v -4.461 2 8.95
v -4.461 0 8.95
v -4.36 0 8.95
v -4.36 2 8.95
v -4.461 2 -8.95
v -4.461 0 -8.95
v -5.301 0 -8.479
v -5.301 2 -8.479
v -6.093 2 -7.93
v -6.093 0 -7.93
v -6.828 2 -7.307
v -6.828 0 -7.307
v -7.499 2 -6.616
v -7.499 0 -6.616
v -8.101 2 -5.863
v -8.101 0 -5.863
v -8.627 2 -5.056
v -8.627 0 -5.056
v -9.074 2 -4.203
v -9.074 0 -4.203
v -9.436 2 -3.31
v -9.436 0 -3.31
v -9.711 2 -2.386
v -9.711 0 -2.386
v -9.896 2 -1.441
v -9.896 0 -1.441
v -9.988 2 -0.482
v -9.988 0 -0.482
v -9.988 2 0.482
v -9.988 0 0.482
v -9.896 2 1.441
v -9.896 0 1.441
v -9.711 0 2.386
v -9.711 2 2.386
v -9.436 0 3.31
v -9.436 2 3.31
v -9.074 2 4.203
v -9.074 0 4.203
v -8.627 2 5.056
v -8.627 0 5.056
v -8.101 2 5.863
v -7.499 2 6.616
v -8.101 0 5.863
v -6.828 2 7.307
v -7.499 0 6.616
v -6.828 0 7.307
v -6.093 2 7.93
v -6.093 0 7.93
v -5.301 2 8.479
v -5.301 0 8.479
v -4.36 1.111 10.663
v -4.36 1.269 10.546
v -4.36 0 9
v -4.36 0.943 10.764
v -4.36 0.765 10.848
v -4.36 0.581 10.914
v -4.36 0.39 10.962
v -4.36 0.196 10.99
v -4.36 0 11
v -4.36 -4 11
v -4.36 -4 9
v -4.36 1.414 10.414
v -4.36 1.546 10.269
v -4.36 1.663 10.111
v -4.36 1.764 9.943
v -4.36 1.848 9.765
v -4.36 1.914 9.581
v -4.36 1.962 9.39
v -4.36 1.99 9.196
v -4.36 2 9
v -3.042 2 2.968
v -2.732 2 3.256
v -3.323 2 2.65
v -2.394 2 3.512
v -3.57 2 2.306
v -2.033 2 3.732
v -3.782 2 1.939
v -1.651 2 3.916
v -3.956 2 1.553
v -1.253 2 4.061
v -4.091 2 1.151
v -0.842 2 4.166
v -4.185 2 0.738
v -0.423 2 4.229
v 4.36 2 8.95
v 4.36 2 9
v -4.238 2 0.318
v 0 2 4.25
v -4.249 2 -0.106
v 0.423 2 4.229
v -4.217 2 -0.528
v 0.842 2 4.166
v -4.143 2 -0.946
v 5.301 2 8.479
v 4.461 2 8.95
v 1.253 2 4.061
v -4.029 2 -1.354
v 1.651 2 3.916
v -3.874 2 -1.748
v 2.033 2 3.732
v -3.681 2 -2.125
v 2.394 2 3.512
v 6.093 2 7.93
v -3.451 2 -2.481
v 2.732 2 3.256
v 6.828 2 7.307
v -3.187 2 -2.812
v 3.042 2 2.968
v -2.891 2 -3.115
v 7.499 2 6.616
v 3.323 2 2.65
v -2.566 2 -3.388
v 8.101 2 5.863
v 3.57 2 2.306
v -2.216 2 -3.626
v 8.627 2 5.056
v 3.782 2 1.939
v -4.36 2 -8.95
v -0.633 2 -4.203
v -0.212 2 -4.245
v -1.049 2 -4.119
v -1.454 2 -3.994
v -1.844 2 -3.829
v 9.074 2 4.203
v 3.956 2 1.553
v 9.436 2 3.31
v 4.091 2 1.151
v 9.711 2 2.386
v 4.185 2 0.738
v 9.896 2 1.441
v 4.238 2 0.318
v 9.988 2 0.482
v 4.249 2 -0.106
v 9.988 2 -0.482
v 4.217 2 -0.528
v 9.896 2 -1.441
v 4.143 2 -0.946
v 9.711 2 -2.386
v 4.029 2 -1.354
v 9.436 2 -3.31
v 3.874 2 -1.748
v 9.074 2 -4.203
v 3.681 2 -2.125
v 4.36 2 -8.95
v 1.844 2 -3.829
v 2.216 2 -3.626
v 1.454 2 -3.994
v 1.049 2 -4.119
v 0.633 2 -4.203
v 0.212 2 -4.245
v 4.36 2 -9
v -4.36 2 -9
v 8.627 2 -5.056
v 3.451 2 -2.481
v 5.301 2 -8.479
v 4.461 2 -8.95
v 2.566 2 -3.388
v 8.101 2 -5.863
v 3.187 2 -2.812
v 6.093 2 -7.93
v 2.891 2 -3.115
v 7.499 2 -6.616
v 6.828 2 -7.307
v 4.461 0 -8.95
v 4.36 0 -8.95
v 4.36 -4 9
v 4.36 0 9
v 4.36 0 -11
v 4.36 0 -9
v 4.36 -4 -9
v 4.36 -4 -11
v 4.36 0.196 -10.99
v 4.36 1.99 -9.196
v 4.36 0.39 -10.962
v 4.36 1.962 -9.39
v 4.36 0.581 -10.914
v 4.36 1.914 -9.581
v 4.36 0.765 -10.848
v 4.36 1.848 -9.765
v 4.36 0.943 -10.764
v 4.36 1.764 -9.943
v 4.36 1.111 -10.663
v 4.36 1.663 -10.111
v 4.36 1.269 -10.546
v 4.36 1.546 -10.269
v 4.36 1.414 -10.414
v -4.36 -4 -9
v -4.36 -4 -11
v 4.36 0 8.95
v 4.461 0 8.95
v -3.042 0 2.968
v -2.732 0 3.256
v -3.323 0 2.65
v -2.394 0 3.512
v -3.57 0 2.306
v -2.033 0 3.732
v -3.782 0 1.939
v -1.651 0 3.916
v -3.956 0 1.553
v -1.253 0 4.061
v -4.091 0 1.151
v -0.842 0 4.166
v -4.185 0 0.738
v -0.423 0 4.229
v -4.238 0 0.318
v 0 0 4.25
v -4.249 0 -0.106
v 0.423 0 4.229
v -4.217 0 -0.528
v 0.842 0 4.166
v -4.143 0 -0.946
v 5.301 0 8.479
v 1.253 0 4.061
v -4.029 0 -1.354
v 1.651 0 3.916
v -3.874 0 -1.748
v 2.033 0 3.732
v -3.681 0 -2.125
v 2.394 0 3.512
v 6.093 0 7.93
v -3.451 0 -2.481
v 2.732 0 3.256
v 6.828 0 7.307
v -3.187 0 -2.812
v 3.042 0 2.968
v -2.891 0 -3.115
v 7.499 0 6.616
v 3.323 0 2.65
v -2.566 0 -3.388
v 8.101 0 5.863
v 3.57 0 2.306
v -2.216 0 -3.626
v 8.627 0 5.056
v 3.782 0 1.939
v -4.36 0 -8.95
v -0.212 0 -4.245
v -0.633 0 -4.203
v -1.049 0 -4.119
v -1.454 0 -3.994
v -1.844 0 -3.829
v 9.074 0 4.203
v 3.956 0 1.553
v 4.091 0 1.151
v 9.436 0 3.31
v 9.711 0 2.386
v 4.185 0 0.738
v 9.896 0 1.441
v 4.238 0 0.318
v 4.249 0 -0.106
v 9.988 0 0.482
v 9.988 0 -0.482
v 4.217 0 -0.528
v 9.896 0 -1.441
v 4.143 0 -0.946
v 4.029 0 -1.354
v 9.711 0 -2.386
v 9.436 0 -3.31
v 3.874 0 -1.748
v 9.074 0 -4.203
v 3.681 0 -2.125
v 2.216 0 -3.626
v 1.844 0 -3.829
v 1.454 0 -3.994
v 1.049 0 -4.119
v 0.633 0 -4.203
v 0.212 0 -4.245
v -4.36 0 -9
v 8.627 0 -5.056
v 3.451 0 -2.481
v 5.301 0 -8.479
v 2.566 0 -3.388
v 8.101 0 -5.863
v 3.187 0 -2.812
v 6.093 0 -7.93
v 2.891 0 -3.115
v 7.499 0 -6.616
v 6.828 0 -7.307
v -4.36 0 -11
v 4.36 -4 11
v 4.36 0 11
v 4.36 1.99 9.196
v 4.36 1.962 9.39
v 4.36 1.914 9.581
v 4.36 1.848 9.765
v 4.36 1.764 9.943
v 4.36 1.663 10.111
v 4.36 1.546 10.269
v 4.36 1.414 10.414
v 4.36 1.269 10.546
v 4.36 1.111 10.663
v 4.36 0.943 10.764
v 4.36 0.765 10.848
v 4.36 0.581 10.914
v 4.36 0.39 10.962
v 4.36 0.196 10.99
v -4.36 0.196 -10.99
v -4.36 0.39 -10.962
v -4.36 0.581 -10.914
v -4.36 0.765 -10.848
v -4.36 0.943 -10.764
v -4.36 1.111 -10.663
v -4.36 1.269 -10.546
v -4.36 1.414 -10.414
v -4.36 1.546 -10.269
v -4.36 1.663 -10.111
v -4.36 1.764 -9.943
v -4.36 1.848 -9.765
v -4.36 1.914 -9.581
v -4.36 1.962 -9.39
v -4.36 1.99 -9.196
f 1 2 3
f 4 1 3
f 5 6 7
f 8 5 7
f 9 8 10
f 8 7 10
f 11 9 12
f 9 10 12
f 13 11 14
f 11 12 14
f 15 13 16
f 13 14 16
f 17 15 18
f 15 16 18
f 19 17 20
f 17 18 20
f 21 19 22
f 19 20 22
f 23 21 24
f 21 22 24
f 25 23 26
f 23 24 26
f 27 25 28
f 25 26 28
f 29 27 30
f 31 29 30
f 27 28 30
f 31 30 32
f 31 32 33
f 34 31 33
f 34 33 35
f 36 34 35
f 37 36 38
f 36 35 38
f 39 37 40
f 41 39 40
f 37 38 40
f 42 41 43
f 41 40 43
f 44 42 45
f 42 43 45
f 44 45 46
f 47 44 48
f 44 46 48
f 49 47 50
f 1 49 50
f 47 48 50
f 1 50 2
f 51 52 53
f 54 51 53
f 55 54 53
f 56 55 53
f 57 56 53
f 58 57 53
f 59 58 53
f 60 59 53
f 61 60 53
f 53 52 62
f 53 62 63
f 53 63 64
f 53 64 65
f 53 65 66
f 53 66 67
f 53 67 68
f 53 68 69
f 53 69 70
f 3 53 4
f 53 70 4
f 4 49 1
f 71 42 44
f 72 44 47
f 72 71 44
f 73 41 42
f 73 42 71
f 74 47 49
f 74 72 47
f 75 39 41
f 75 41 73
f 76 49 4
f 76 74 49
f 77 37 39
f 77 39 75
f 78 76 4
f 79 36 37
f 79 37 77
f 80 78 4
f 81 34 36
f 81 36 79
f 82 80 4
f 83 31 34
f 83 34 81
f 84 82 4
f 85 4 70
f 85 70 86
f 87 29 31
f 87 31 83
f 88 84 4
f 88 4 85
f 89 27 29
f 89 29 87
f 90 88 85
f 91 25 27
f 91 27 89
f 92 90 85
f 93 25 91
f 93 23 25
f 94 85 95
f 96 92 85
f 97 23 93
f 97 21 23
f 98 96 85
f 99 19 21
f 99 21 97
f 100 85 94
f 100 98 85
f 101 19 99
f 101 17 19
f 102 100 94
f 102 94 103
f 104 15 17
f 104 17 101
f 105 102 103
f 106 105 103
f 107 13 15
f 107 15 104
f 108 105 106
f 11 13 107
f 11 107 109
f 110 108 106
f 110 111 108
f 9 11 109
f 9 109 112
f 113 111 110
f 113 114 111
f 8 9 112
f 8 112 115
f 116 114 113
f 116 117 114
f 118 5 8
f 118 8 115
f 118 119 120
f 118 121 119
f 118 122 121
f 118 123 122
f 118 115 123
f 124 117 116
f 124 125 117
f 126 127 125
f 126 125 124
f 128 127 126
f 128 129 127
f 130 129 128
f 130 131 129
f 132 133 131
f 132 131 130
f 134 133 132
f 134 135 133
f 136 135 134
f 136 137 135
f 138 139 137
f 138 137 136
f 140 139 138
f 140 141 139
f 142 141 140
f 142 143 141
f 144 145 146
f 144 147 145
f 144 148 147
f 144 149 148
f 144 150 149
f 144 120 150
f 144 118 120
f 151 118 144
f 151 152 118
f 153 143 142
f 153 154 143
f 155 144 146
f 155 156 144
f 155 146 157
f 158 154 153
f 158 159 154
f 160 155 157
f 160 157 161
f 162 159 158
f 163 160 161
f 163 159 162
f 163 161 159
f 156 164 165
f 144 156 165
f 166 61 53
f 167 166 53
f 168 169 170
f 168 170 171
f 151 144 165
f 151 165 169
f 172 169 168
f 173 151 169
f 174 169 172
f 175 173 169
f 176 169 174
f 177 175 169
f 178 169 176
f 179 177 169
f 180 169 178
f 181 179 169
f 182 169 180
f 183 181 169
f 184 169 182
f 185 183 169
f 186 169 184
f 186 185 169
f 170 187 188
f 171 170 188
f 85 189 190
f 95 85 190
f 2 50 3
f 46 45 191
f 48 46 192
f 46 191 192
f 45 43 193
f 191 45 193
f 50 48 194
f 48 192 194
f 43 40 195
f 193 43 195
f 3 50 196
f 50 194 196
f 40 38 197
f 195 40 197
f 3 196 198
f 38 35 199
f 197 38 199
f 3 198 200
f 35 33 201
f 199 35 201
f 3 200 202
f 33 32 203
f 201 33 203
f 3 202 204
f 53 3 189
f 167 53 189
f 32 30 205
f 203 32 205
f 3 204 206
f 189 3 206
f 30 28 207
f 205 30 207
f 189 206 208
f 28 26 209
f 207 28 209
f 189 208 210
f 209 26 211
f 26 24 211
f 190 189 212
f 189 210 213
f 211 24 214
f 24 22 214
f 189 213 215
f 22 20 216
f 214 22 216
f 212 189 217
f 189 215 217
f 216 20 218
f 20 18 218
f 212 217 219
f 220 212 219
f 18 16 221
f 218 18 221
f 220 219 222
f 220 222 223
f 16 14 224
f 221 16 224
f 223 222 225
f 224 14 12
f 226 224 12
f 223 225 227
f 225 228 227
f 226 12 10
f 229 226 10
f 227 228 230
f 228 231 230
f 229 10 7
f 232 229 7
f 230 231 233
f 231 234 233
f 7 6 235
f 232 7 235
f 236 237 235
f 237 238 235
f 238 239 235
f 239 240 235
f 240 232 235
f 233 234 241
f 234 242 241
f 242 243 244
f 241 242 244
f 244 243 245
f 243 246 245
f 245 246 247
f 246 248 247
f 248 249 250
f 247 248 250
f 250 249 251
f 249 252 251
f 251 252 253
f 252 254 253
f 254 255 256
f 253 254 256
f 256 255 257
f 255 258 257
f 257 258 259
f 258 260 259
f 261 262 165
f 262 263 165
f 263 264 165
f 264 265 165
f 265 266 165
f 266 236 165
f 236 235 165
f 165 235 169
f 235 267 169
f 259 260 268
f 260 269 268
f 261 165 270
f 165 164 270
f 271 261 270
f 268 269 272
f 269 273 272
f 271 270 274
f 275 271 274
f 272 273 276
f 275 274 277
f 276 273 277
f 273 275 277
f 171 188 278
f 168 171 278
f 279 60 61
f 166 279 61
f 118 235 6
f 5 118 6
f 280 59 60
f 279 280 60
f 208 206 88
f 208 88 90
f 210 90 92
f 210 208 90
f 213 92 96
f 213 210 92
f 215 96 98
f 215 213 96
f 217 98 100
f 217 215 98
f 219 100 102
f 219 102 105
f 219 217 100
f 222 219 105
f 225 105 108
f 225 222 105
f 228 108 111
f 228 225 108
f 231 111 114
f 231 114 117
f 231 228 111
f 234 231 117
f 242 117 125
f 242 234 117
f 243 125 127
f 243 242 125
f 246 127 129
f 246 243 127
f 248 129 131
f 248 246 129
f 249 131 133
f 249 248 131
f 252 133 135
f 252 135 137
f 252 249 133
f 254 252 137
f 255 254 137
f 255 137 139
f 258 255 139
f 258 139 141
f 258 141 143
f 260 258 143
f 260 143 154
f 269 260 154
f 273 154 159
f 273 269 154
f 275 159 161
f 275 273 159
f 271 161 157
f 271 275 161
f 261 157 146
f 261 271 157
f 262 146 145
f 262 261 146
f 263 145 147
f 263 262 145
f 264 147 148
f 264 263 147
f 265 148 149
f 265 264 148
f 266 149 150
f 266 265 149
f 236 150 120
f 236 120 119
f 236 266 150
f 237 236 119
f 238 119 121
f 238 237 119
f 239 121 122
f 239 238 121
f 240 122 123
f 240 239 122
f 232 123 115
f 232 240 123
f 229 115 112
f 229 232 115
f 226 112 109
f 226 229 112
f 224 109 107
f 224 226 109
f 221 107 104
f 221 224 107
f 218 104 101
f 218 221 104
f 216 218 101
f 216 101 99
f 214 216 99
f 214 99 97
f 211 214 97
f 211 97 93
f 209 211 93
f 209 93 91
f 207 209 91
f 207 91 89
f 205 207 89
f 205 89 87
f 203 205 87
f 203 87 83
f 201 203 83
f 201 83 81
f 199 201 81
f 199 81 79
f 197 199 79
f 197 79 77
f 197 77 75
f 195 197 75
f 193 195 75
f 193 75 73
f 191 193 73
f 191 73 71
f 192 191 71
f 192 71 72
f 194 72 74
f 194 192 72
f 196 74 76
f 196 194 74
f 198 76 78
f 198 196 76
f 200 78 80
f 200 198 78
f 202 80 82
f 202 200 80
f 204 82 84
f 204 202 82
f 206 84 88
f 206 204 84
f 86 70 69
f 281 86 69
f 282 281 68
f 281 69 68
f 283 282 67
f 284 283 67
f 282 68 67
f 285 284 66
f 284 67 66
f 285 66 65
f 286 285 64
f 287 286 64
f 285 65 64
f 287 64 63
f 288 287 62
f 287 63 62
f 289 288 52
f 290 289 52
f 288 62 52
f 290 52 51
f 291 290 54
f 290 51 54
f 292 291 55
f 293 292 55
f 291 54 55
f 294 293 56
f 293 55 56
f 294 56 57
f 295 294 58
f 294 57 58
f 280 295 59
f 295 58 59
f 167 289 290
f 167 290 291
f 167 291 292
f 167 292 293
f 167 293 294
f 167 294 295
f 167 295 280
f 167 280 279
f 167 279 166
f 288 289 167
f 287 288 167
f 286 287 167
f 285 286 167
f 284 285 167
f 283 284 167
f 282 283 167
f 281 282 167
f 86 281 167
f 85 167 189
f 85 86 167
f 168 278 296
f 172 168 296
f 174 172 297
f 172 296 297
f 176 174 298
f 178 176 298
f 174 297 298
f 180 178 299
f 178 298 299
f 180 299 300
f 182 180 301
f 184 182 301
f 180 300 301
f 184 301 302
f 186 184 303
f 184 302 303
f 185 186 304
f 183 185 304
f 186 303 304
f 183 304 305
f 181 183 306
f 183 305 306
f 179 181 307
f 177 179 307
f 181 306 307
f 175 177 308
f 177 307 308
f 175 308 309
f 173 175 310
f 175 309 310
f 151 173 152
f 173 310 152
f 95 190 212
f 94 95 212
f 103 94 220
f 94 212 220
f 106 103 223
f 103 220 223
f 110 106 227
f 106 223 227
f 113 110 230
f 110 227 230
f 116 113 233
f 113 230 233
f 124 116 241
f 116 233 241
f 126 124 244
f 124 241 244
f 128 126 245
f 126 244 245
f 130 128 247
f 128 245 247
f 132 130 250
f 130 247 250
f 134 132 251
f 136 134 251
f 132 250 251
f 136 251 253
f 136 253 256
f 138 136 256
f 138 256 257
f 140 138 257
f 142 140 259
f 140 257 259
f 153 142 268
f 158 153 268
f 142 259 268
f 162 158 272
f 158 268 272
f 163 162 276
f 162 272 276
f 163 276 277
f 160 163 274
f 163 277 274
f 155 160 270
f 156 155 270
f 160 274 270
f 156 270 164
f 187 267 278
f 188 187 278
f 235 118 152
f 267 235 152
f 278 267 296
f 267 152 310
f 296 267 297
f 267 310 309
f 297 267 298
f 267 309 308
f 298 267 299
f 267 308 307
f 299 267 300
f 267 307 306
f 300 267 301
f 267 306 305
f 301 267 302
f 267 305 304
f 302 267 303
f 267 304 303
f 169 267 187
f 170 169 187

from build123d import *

# Parameters (mm, degrees)
EXTRUDE_1_DEPTH      = 4.360333
EXTRUDE_1_DEPTH_BACK = 4.360333
EXTRUDE_2_DEPTH      = 2
SKETCH_3_R           = 4.25
CUT_EXTRUDE_1_DEPTH  = 2


with BuildPart() as part:
    # 草图1 → 凸台-拉伸1 (new, two sides: drawn at the far end of the back side and taken through both)
    with BuildSketch(Plane(origin=(0, 0, 0), x_dir=(0, 0, -1), z_dir=(1, 0, 0)).offset(-EXTRUDE_1_DEPTH_BACK)):
        with BuildLine():
            Line((-11, 0), (-11, -4))
            Line((-11, -4), (-9, -4))
            Line((-9, -4), (-9, 0))
            Line((-9, 0), (9, 0))
            Line((9, 0), (9, -4))
            Line((9, -4), (11, -4))
            Line((11, -4), (11, 0))
            ThreePointArc((11, 0), (10.414213562, 1.414213562), (9, 2))
            Line((9, 2), (-9, 2))
            ThreePointArc((-9, 2), (-10.414213562, 1.414213562), (-11, 0))
        make_face()
    extrude(amount=EXTRUDE_1_DEPTH + EXTRUDE_1_DEPTH_BACK)

    # 草图2 → 凸台-拉伸2 (add)
    with BuildSketch(Plane(origin=(0, 0, 0), x_dir=(1, 0, 0), z_dir=(0, 1, 0))):
        with BuildLine():
            Line((-4.460661386, -8.95), (4.460661386, -8.95))
            ThreePointArc((4.460661386, -8.95), (10, 0), (4.460661386, 8.95))
            Line((4.460661386, 8.95), (-4.460661386, 8.95))
            ThreePointArc((-4.460661386, 8.95), (-10, 0), (-4.460661386, -8.95))
        make_face()
    extrude(amount=EXTRUDE_2_DEPTH)

    # 草图3 → 切除-拉伸1 (cut)
    with BuildSketch(Plane(origin=(0, 0, 0), x_dir=(1, 0, 0), z_dir=(0, 1, 0))):
        Circle(SKETCH_3_R)
    extrude(amount=CUT_EXTRUDE_1_DEPTH, mode=Mode.SUBTRACT)


solid = part.part
